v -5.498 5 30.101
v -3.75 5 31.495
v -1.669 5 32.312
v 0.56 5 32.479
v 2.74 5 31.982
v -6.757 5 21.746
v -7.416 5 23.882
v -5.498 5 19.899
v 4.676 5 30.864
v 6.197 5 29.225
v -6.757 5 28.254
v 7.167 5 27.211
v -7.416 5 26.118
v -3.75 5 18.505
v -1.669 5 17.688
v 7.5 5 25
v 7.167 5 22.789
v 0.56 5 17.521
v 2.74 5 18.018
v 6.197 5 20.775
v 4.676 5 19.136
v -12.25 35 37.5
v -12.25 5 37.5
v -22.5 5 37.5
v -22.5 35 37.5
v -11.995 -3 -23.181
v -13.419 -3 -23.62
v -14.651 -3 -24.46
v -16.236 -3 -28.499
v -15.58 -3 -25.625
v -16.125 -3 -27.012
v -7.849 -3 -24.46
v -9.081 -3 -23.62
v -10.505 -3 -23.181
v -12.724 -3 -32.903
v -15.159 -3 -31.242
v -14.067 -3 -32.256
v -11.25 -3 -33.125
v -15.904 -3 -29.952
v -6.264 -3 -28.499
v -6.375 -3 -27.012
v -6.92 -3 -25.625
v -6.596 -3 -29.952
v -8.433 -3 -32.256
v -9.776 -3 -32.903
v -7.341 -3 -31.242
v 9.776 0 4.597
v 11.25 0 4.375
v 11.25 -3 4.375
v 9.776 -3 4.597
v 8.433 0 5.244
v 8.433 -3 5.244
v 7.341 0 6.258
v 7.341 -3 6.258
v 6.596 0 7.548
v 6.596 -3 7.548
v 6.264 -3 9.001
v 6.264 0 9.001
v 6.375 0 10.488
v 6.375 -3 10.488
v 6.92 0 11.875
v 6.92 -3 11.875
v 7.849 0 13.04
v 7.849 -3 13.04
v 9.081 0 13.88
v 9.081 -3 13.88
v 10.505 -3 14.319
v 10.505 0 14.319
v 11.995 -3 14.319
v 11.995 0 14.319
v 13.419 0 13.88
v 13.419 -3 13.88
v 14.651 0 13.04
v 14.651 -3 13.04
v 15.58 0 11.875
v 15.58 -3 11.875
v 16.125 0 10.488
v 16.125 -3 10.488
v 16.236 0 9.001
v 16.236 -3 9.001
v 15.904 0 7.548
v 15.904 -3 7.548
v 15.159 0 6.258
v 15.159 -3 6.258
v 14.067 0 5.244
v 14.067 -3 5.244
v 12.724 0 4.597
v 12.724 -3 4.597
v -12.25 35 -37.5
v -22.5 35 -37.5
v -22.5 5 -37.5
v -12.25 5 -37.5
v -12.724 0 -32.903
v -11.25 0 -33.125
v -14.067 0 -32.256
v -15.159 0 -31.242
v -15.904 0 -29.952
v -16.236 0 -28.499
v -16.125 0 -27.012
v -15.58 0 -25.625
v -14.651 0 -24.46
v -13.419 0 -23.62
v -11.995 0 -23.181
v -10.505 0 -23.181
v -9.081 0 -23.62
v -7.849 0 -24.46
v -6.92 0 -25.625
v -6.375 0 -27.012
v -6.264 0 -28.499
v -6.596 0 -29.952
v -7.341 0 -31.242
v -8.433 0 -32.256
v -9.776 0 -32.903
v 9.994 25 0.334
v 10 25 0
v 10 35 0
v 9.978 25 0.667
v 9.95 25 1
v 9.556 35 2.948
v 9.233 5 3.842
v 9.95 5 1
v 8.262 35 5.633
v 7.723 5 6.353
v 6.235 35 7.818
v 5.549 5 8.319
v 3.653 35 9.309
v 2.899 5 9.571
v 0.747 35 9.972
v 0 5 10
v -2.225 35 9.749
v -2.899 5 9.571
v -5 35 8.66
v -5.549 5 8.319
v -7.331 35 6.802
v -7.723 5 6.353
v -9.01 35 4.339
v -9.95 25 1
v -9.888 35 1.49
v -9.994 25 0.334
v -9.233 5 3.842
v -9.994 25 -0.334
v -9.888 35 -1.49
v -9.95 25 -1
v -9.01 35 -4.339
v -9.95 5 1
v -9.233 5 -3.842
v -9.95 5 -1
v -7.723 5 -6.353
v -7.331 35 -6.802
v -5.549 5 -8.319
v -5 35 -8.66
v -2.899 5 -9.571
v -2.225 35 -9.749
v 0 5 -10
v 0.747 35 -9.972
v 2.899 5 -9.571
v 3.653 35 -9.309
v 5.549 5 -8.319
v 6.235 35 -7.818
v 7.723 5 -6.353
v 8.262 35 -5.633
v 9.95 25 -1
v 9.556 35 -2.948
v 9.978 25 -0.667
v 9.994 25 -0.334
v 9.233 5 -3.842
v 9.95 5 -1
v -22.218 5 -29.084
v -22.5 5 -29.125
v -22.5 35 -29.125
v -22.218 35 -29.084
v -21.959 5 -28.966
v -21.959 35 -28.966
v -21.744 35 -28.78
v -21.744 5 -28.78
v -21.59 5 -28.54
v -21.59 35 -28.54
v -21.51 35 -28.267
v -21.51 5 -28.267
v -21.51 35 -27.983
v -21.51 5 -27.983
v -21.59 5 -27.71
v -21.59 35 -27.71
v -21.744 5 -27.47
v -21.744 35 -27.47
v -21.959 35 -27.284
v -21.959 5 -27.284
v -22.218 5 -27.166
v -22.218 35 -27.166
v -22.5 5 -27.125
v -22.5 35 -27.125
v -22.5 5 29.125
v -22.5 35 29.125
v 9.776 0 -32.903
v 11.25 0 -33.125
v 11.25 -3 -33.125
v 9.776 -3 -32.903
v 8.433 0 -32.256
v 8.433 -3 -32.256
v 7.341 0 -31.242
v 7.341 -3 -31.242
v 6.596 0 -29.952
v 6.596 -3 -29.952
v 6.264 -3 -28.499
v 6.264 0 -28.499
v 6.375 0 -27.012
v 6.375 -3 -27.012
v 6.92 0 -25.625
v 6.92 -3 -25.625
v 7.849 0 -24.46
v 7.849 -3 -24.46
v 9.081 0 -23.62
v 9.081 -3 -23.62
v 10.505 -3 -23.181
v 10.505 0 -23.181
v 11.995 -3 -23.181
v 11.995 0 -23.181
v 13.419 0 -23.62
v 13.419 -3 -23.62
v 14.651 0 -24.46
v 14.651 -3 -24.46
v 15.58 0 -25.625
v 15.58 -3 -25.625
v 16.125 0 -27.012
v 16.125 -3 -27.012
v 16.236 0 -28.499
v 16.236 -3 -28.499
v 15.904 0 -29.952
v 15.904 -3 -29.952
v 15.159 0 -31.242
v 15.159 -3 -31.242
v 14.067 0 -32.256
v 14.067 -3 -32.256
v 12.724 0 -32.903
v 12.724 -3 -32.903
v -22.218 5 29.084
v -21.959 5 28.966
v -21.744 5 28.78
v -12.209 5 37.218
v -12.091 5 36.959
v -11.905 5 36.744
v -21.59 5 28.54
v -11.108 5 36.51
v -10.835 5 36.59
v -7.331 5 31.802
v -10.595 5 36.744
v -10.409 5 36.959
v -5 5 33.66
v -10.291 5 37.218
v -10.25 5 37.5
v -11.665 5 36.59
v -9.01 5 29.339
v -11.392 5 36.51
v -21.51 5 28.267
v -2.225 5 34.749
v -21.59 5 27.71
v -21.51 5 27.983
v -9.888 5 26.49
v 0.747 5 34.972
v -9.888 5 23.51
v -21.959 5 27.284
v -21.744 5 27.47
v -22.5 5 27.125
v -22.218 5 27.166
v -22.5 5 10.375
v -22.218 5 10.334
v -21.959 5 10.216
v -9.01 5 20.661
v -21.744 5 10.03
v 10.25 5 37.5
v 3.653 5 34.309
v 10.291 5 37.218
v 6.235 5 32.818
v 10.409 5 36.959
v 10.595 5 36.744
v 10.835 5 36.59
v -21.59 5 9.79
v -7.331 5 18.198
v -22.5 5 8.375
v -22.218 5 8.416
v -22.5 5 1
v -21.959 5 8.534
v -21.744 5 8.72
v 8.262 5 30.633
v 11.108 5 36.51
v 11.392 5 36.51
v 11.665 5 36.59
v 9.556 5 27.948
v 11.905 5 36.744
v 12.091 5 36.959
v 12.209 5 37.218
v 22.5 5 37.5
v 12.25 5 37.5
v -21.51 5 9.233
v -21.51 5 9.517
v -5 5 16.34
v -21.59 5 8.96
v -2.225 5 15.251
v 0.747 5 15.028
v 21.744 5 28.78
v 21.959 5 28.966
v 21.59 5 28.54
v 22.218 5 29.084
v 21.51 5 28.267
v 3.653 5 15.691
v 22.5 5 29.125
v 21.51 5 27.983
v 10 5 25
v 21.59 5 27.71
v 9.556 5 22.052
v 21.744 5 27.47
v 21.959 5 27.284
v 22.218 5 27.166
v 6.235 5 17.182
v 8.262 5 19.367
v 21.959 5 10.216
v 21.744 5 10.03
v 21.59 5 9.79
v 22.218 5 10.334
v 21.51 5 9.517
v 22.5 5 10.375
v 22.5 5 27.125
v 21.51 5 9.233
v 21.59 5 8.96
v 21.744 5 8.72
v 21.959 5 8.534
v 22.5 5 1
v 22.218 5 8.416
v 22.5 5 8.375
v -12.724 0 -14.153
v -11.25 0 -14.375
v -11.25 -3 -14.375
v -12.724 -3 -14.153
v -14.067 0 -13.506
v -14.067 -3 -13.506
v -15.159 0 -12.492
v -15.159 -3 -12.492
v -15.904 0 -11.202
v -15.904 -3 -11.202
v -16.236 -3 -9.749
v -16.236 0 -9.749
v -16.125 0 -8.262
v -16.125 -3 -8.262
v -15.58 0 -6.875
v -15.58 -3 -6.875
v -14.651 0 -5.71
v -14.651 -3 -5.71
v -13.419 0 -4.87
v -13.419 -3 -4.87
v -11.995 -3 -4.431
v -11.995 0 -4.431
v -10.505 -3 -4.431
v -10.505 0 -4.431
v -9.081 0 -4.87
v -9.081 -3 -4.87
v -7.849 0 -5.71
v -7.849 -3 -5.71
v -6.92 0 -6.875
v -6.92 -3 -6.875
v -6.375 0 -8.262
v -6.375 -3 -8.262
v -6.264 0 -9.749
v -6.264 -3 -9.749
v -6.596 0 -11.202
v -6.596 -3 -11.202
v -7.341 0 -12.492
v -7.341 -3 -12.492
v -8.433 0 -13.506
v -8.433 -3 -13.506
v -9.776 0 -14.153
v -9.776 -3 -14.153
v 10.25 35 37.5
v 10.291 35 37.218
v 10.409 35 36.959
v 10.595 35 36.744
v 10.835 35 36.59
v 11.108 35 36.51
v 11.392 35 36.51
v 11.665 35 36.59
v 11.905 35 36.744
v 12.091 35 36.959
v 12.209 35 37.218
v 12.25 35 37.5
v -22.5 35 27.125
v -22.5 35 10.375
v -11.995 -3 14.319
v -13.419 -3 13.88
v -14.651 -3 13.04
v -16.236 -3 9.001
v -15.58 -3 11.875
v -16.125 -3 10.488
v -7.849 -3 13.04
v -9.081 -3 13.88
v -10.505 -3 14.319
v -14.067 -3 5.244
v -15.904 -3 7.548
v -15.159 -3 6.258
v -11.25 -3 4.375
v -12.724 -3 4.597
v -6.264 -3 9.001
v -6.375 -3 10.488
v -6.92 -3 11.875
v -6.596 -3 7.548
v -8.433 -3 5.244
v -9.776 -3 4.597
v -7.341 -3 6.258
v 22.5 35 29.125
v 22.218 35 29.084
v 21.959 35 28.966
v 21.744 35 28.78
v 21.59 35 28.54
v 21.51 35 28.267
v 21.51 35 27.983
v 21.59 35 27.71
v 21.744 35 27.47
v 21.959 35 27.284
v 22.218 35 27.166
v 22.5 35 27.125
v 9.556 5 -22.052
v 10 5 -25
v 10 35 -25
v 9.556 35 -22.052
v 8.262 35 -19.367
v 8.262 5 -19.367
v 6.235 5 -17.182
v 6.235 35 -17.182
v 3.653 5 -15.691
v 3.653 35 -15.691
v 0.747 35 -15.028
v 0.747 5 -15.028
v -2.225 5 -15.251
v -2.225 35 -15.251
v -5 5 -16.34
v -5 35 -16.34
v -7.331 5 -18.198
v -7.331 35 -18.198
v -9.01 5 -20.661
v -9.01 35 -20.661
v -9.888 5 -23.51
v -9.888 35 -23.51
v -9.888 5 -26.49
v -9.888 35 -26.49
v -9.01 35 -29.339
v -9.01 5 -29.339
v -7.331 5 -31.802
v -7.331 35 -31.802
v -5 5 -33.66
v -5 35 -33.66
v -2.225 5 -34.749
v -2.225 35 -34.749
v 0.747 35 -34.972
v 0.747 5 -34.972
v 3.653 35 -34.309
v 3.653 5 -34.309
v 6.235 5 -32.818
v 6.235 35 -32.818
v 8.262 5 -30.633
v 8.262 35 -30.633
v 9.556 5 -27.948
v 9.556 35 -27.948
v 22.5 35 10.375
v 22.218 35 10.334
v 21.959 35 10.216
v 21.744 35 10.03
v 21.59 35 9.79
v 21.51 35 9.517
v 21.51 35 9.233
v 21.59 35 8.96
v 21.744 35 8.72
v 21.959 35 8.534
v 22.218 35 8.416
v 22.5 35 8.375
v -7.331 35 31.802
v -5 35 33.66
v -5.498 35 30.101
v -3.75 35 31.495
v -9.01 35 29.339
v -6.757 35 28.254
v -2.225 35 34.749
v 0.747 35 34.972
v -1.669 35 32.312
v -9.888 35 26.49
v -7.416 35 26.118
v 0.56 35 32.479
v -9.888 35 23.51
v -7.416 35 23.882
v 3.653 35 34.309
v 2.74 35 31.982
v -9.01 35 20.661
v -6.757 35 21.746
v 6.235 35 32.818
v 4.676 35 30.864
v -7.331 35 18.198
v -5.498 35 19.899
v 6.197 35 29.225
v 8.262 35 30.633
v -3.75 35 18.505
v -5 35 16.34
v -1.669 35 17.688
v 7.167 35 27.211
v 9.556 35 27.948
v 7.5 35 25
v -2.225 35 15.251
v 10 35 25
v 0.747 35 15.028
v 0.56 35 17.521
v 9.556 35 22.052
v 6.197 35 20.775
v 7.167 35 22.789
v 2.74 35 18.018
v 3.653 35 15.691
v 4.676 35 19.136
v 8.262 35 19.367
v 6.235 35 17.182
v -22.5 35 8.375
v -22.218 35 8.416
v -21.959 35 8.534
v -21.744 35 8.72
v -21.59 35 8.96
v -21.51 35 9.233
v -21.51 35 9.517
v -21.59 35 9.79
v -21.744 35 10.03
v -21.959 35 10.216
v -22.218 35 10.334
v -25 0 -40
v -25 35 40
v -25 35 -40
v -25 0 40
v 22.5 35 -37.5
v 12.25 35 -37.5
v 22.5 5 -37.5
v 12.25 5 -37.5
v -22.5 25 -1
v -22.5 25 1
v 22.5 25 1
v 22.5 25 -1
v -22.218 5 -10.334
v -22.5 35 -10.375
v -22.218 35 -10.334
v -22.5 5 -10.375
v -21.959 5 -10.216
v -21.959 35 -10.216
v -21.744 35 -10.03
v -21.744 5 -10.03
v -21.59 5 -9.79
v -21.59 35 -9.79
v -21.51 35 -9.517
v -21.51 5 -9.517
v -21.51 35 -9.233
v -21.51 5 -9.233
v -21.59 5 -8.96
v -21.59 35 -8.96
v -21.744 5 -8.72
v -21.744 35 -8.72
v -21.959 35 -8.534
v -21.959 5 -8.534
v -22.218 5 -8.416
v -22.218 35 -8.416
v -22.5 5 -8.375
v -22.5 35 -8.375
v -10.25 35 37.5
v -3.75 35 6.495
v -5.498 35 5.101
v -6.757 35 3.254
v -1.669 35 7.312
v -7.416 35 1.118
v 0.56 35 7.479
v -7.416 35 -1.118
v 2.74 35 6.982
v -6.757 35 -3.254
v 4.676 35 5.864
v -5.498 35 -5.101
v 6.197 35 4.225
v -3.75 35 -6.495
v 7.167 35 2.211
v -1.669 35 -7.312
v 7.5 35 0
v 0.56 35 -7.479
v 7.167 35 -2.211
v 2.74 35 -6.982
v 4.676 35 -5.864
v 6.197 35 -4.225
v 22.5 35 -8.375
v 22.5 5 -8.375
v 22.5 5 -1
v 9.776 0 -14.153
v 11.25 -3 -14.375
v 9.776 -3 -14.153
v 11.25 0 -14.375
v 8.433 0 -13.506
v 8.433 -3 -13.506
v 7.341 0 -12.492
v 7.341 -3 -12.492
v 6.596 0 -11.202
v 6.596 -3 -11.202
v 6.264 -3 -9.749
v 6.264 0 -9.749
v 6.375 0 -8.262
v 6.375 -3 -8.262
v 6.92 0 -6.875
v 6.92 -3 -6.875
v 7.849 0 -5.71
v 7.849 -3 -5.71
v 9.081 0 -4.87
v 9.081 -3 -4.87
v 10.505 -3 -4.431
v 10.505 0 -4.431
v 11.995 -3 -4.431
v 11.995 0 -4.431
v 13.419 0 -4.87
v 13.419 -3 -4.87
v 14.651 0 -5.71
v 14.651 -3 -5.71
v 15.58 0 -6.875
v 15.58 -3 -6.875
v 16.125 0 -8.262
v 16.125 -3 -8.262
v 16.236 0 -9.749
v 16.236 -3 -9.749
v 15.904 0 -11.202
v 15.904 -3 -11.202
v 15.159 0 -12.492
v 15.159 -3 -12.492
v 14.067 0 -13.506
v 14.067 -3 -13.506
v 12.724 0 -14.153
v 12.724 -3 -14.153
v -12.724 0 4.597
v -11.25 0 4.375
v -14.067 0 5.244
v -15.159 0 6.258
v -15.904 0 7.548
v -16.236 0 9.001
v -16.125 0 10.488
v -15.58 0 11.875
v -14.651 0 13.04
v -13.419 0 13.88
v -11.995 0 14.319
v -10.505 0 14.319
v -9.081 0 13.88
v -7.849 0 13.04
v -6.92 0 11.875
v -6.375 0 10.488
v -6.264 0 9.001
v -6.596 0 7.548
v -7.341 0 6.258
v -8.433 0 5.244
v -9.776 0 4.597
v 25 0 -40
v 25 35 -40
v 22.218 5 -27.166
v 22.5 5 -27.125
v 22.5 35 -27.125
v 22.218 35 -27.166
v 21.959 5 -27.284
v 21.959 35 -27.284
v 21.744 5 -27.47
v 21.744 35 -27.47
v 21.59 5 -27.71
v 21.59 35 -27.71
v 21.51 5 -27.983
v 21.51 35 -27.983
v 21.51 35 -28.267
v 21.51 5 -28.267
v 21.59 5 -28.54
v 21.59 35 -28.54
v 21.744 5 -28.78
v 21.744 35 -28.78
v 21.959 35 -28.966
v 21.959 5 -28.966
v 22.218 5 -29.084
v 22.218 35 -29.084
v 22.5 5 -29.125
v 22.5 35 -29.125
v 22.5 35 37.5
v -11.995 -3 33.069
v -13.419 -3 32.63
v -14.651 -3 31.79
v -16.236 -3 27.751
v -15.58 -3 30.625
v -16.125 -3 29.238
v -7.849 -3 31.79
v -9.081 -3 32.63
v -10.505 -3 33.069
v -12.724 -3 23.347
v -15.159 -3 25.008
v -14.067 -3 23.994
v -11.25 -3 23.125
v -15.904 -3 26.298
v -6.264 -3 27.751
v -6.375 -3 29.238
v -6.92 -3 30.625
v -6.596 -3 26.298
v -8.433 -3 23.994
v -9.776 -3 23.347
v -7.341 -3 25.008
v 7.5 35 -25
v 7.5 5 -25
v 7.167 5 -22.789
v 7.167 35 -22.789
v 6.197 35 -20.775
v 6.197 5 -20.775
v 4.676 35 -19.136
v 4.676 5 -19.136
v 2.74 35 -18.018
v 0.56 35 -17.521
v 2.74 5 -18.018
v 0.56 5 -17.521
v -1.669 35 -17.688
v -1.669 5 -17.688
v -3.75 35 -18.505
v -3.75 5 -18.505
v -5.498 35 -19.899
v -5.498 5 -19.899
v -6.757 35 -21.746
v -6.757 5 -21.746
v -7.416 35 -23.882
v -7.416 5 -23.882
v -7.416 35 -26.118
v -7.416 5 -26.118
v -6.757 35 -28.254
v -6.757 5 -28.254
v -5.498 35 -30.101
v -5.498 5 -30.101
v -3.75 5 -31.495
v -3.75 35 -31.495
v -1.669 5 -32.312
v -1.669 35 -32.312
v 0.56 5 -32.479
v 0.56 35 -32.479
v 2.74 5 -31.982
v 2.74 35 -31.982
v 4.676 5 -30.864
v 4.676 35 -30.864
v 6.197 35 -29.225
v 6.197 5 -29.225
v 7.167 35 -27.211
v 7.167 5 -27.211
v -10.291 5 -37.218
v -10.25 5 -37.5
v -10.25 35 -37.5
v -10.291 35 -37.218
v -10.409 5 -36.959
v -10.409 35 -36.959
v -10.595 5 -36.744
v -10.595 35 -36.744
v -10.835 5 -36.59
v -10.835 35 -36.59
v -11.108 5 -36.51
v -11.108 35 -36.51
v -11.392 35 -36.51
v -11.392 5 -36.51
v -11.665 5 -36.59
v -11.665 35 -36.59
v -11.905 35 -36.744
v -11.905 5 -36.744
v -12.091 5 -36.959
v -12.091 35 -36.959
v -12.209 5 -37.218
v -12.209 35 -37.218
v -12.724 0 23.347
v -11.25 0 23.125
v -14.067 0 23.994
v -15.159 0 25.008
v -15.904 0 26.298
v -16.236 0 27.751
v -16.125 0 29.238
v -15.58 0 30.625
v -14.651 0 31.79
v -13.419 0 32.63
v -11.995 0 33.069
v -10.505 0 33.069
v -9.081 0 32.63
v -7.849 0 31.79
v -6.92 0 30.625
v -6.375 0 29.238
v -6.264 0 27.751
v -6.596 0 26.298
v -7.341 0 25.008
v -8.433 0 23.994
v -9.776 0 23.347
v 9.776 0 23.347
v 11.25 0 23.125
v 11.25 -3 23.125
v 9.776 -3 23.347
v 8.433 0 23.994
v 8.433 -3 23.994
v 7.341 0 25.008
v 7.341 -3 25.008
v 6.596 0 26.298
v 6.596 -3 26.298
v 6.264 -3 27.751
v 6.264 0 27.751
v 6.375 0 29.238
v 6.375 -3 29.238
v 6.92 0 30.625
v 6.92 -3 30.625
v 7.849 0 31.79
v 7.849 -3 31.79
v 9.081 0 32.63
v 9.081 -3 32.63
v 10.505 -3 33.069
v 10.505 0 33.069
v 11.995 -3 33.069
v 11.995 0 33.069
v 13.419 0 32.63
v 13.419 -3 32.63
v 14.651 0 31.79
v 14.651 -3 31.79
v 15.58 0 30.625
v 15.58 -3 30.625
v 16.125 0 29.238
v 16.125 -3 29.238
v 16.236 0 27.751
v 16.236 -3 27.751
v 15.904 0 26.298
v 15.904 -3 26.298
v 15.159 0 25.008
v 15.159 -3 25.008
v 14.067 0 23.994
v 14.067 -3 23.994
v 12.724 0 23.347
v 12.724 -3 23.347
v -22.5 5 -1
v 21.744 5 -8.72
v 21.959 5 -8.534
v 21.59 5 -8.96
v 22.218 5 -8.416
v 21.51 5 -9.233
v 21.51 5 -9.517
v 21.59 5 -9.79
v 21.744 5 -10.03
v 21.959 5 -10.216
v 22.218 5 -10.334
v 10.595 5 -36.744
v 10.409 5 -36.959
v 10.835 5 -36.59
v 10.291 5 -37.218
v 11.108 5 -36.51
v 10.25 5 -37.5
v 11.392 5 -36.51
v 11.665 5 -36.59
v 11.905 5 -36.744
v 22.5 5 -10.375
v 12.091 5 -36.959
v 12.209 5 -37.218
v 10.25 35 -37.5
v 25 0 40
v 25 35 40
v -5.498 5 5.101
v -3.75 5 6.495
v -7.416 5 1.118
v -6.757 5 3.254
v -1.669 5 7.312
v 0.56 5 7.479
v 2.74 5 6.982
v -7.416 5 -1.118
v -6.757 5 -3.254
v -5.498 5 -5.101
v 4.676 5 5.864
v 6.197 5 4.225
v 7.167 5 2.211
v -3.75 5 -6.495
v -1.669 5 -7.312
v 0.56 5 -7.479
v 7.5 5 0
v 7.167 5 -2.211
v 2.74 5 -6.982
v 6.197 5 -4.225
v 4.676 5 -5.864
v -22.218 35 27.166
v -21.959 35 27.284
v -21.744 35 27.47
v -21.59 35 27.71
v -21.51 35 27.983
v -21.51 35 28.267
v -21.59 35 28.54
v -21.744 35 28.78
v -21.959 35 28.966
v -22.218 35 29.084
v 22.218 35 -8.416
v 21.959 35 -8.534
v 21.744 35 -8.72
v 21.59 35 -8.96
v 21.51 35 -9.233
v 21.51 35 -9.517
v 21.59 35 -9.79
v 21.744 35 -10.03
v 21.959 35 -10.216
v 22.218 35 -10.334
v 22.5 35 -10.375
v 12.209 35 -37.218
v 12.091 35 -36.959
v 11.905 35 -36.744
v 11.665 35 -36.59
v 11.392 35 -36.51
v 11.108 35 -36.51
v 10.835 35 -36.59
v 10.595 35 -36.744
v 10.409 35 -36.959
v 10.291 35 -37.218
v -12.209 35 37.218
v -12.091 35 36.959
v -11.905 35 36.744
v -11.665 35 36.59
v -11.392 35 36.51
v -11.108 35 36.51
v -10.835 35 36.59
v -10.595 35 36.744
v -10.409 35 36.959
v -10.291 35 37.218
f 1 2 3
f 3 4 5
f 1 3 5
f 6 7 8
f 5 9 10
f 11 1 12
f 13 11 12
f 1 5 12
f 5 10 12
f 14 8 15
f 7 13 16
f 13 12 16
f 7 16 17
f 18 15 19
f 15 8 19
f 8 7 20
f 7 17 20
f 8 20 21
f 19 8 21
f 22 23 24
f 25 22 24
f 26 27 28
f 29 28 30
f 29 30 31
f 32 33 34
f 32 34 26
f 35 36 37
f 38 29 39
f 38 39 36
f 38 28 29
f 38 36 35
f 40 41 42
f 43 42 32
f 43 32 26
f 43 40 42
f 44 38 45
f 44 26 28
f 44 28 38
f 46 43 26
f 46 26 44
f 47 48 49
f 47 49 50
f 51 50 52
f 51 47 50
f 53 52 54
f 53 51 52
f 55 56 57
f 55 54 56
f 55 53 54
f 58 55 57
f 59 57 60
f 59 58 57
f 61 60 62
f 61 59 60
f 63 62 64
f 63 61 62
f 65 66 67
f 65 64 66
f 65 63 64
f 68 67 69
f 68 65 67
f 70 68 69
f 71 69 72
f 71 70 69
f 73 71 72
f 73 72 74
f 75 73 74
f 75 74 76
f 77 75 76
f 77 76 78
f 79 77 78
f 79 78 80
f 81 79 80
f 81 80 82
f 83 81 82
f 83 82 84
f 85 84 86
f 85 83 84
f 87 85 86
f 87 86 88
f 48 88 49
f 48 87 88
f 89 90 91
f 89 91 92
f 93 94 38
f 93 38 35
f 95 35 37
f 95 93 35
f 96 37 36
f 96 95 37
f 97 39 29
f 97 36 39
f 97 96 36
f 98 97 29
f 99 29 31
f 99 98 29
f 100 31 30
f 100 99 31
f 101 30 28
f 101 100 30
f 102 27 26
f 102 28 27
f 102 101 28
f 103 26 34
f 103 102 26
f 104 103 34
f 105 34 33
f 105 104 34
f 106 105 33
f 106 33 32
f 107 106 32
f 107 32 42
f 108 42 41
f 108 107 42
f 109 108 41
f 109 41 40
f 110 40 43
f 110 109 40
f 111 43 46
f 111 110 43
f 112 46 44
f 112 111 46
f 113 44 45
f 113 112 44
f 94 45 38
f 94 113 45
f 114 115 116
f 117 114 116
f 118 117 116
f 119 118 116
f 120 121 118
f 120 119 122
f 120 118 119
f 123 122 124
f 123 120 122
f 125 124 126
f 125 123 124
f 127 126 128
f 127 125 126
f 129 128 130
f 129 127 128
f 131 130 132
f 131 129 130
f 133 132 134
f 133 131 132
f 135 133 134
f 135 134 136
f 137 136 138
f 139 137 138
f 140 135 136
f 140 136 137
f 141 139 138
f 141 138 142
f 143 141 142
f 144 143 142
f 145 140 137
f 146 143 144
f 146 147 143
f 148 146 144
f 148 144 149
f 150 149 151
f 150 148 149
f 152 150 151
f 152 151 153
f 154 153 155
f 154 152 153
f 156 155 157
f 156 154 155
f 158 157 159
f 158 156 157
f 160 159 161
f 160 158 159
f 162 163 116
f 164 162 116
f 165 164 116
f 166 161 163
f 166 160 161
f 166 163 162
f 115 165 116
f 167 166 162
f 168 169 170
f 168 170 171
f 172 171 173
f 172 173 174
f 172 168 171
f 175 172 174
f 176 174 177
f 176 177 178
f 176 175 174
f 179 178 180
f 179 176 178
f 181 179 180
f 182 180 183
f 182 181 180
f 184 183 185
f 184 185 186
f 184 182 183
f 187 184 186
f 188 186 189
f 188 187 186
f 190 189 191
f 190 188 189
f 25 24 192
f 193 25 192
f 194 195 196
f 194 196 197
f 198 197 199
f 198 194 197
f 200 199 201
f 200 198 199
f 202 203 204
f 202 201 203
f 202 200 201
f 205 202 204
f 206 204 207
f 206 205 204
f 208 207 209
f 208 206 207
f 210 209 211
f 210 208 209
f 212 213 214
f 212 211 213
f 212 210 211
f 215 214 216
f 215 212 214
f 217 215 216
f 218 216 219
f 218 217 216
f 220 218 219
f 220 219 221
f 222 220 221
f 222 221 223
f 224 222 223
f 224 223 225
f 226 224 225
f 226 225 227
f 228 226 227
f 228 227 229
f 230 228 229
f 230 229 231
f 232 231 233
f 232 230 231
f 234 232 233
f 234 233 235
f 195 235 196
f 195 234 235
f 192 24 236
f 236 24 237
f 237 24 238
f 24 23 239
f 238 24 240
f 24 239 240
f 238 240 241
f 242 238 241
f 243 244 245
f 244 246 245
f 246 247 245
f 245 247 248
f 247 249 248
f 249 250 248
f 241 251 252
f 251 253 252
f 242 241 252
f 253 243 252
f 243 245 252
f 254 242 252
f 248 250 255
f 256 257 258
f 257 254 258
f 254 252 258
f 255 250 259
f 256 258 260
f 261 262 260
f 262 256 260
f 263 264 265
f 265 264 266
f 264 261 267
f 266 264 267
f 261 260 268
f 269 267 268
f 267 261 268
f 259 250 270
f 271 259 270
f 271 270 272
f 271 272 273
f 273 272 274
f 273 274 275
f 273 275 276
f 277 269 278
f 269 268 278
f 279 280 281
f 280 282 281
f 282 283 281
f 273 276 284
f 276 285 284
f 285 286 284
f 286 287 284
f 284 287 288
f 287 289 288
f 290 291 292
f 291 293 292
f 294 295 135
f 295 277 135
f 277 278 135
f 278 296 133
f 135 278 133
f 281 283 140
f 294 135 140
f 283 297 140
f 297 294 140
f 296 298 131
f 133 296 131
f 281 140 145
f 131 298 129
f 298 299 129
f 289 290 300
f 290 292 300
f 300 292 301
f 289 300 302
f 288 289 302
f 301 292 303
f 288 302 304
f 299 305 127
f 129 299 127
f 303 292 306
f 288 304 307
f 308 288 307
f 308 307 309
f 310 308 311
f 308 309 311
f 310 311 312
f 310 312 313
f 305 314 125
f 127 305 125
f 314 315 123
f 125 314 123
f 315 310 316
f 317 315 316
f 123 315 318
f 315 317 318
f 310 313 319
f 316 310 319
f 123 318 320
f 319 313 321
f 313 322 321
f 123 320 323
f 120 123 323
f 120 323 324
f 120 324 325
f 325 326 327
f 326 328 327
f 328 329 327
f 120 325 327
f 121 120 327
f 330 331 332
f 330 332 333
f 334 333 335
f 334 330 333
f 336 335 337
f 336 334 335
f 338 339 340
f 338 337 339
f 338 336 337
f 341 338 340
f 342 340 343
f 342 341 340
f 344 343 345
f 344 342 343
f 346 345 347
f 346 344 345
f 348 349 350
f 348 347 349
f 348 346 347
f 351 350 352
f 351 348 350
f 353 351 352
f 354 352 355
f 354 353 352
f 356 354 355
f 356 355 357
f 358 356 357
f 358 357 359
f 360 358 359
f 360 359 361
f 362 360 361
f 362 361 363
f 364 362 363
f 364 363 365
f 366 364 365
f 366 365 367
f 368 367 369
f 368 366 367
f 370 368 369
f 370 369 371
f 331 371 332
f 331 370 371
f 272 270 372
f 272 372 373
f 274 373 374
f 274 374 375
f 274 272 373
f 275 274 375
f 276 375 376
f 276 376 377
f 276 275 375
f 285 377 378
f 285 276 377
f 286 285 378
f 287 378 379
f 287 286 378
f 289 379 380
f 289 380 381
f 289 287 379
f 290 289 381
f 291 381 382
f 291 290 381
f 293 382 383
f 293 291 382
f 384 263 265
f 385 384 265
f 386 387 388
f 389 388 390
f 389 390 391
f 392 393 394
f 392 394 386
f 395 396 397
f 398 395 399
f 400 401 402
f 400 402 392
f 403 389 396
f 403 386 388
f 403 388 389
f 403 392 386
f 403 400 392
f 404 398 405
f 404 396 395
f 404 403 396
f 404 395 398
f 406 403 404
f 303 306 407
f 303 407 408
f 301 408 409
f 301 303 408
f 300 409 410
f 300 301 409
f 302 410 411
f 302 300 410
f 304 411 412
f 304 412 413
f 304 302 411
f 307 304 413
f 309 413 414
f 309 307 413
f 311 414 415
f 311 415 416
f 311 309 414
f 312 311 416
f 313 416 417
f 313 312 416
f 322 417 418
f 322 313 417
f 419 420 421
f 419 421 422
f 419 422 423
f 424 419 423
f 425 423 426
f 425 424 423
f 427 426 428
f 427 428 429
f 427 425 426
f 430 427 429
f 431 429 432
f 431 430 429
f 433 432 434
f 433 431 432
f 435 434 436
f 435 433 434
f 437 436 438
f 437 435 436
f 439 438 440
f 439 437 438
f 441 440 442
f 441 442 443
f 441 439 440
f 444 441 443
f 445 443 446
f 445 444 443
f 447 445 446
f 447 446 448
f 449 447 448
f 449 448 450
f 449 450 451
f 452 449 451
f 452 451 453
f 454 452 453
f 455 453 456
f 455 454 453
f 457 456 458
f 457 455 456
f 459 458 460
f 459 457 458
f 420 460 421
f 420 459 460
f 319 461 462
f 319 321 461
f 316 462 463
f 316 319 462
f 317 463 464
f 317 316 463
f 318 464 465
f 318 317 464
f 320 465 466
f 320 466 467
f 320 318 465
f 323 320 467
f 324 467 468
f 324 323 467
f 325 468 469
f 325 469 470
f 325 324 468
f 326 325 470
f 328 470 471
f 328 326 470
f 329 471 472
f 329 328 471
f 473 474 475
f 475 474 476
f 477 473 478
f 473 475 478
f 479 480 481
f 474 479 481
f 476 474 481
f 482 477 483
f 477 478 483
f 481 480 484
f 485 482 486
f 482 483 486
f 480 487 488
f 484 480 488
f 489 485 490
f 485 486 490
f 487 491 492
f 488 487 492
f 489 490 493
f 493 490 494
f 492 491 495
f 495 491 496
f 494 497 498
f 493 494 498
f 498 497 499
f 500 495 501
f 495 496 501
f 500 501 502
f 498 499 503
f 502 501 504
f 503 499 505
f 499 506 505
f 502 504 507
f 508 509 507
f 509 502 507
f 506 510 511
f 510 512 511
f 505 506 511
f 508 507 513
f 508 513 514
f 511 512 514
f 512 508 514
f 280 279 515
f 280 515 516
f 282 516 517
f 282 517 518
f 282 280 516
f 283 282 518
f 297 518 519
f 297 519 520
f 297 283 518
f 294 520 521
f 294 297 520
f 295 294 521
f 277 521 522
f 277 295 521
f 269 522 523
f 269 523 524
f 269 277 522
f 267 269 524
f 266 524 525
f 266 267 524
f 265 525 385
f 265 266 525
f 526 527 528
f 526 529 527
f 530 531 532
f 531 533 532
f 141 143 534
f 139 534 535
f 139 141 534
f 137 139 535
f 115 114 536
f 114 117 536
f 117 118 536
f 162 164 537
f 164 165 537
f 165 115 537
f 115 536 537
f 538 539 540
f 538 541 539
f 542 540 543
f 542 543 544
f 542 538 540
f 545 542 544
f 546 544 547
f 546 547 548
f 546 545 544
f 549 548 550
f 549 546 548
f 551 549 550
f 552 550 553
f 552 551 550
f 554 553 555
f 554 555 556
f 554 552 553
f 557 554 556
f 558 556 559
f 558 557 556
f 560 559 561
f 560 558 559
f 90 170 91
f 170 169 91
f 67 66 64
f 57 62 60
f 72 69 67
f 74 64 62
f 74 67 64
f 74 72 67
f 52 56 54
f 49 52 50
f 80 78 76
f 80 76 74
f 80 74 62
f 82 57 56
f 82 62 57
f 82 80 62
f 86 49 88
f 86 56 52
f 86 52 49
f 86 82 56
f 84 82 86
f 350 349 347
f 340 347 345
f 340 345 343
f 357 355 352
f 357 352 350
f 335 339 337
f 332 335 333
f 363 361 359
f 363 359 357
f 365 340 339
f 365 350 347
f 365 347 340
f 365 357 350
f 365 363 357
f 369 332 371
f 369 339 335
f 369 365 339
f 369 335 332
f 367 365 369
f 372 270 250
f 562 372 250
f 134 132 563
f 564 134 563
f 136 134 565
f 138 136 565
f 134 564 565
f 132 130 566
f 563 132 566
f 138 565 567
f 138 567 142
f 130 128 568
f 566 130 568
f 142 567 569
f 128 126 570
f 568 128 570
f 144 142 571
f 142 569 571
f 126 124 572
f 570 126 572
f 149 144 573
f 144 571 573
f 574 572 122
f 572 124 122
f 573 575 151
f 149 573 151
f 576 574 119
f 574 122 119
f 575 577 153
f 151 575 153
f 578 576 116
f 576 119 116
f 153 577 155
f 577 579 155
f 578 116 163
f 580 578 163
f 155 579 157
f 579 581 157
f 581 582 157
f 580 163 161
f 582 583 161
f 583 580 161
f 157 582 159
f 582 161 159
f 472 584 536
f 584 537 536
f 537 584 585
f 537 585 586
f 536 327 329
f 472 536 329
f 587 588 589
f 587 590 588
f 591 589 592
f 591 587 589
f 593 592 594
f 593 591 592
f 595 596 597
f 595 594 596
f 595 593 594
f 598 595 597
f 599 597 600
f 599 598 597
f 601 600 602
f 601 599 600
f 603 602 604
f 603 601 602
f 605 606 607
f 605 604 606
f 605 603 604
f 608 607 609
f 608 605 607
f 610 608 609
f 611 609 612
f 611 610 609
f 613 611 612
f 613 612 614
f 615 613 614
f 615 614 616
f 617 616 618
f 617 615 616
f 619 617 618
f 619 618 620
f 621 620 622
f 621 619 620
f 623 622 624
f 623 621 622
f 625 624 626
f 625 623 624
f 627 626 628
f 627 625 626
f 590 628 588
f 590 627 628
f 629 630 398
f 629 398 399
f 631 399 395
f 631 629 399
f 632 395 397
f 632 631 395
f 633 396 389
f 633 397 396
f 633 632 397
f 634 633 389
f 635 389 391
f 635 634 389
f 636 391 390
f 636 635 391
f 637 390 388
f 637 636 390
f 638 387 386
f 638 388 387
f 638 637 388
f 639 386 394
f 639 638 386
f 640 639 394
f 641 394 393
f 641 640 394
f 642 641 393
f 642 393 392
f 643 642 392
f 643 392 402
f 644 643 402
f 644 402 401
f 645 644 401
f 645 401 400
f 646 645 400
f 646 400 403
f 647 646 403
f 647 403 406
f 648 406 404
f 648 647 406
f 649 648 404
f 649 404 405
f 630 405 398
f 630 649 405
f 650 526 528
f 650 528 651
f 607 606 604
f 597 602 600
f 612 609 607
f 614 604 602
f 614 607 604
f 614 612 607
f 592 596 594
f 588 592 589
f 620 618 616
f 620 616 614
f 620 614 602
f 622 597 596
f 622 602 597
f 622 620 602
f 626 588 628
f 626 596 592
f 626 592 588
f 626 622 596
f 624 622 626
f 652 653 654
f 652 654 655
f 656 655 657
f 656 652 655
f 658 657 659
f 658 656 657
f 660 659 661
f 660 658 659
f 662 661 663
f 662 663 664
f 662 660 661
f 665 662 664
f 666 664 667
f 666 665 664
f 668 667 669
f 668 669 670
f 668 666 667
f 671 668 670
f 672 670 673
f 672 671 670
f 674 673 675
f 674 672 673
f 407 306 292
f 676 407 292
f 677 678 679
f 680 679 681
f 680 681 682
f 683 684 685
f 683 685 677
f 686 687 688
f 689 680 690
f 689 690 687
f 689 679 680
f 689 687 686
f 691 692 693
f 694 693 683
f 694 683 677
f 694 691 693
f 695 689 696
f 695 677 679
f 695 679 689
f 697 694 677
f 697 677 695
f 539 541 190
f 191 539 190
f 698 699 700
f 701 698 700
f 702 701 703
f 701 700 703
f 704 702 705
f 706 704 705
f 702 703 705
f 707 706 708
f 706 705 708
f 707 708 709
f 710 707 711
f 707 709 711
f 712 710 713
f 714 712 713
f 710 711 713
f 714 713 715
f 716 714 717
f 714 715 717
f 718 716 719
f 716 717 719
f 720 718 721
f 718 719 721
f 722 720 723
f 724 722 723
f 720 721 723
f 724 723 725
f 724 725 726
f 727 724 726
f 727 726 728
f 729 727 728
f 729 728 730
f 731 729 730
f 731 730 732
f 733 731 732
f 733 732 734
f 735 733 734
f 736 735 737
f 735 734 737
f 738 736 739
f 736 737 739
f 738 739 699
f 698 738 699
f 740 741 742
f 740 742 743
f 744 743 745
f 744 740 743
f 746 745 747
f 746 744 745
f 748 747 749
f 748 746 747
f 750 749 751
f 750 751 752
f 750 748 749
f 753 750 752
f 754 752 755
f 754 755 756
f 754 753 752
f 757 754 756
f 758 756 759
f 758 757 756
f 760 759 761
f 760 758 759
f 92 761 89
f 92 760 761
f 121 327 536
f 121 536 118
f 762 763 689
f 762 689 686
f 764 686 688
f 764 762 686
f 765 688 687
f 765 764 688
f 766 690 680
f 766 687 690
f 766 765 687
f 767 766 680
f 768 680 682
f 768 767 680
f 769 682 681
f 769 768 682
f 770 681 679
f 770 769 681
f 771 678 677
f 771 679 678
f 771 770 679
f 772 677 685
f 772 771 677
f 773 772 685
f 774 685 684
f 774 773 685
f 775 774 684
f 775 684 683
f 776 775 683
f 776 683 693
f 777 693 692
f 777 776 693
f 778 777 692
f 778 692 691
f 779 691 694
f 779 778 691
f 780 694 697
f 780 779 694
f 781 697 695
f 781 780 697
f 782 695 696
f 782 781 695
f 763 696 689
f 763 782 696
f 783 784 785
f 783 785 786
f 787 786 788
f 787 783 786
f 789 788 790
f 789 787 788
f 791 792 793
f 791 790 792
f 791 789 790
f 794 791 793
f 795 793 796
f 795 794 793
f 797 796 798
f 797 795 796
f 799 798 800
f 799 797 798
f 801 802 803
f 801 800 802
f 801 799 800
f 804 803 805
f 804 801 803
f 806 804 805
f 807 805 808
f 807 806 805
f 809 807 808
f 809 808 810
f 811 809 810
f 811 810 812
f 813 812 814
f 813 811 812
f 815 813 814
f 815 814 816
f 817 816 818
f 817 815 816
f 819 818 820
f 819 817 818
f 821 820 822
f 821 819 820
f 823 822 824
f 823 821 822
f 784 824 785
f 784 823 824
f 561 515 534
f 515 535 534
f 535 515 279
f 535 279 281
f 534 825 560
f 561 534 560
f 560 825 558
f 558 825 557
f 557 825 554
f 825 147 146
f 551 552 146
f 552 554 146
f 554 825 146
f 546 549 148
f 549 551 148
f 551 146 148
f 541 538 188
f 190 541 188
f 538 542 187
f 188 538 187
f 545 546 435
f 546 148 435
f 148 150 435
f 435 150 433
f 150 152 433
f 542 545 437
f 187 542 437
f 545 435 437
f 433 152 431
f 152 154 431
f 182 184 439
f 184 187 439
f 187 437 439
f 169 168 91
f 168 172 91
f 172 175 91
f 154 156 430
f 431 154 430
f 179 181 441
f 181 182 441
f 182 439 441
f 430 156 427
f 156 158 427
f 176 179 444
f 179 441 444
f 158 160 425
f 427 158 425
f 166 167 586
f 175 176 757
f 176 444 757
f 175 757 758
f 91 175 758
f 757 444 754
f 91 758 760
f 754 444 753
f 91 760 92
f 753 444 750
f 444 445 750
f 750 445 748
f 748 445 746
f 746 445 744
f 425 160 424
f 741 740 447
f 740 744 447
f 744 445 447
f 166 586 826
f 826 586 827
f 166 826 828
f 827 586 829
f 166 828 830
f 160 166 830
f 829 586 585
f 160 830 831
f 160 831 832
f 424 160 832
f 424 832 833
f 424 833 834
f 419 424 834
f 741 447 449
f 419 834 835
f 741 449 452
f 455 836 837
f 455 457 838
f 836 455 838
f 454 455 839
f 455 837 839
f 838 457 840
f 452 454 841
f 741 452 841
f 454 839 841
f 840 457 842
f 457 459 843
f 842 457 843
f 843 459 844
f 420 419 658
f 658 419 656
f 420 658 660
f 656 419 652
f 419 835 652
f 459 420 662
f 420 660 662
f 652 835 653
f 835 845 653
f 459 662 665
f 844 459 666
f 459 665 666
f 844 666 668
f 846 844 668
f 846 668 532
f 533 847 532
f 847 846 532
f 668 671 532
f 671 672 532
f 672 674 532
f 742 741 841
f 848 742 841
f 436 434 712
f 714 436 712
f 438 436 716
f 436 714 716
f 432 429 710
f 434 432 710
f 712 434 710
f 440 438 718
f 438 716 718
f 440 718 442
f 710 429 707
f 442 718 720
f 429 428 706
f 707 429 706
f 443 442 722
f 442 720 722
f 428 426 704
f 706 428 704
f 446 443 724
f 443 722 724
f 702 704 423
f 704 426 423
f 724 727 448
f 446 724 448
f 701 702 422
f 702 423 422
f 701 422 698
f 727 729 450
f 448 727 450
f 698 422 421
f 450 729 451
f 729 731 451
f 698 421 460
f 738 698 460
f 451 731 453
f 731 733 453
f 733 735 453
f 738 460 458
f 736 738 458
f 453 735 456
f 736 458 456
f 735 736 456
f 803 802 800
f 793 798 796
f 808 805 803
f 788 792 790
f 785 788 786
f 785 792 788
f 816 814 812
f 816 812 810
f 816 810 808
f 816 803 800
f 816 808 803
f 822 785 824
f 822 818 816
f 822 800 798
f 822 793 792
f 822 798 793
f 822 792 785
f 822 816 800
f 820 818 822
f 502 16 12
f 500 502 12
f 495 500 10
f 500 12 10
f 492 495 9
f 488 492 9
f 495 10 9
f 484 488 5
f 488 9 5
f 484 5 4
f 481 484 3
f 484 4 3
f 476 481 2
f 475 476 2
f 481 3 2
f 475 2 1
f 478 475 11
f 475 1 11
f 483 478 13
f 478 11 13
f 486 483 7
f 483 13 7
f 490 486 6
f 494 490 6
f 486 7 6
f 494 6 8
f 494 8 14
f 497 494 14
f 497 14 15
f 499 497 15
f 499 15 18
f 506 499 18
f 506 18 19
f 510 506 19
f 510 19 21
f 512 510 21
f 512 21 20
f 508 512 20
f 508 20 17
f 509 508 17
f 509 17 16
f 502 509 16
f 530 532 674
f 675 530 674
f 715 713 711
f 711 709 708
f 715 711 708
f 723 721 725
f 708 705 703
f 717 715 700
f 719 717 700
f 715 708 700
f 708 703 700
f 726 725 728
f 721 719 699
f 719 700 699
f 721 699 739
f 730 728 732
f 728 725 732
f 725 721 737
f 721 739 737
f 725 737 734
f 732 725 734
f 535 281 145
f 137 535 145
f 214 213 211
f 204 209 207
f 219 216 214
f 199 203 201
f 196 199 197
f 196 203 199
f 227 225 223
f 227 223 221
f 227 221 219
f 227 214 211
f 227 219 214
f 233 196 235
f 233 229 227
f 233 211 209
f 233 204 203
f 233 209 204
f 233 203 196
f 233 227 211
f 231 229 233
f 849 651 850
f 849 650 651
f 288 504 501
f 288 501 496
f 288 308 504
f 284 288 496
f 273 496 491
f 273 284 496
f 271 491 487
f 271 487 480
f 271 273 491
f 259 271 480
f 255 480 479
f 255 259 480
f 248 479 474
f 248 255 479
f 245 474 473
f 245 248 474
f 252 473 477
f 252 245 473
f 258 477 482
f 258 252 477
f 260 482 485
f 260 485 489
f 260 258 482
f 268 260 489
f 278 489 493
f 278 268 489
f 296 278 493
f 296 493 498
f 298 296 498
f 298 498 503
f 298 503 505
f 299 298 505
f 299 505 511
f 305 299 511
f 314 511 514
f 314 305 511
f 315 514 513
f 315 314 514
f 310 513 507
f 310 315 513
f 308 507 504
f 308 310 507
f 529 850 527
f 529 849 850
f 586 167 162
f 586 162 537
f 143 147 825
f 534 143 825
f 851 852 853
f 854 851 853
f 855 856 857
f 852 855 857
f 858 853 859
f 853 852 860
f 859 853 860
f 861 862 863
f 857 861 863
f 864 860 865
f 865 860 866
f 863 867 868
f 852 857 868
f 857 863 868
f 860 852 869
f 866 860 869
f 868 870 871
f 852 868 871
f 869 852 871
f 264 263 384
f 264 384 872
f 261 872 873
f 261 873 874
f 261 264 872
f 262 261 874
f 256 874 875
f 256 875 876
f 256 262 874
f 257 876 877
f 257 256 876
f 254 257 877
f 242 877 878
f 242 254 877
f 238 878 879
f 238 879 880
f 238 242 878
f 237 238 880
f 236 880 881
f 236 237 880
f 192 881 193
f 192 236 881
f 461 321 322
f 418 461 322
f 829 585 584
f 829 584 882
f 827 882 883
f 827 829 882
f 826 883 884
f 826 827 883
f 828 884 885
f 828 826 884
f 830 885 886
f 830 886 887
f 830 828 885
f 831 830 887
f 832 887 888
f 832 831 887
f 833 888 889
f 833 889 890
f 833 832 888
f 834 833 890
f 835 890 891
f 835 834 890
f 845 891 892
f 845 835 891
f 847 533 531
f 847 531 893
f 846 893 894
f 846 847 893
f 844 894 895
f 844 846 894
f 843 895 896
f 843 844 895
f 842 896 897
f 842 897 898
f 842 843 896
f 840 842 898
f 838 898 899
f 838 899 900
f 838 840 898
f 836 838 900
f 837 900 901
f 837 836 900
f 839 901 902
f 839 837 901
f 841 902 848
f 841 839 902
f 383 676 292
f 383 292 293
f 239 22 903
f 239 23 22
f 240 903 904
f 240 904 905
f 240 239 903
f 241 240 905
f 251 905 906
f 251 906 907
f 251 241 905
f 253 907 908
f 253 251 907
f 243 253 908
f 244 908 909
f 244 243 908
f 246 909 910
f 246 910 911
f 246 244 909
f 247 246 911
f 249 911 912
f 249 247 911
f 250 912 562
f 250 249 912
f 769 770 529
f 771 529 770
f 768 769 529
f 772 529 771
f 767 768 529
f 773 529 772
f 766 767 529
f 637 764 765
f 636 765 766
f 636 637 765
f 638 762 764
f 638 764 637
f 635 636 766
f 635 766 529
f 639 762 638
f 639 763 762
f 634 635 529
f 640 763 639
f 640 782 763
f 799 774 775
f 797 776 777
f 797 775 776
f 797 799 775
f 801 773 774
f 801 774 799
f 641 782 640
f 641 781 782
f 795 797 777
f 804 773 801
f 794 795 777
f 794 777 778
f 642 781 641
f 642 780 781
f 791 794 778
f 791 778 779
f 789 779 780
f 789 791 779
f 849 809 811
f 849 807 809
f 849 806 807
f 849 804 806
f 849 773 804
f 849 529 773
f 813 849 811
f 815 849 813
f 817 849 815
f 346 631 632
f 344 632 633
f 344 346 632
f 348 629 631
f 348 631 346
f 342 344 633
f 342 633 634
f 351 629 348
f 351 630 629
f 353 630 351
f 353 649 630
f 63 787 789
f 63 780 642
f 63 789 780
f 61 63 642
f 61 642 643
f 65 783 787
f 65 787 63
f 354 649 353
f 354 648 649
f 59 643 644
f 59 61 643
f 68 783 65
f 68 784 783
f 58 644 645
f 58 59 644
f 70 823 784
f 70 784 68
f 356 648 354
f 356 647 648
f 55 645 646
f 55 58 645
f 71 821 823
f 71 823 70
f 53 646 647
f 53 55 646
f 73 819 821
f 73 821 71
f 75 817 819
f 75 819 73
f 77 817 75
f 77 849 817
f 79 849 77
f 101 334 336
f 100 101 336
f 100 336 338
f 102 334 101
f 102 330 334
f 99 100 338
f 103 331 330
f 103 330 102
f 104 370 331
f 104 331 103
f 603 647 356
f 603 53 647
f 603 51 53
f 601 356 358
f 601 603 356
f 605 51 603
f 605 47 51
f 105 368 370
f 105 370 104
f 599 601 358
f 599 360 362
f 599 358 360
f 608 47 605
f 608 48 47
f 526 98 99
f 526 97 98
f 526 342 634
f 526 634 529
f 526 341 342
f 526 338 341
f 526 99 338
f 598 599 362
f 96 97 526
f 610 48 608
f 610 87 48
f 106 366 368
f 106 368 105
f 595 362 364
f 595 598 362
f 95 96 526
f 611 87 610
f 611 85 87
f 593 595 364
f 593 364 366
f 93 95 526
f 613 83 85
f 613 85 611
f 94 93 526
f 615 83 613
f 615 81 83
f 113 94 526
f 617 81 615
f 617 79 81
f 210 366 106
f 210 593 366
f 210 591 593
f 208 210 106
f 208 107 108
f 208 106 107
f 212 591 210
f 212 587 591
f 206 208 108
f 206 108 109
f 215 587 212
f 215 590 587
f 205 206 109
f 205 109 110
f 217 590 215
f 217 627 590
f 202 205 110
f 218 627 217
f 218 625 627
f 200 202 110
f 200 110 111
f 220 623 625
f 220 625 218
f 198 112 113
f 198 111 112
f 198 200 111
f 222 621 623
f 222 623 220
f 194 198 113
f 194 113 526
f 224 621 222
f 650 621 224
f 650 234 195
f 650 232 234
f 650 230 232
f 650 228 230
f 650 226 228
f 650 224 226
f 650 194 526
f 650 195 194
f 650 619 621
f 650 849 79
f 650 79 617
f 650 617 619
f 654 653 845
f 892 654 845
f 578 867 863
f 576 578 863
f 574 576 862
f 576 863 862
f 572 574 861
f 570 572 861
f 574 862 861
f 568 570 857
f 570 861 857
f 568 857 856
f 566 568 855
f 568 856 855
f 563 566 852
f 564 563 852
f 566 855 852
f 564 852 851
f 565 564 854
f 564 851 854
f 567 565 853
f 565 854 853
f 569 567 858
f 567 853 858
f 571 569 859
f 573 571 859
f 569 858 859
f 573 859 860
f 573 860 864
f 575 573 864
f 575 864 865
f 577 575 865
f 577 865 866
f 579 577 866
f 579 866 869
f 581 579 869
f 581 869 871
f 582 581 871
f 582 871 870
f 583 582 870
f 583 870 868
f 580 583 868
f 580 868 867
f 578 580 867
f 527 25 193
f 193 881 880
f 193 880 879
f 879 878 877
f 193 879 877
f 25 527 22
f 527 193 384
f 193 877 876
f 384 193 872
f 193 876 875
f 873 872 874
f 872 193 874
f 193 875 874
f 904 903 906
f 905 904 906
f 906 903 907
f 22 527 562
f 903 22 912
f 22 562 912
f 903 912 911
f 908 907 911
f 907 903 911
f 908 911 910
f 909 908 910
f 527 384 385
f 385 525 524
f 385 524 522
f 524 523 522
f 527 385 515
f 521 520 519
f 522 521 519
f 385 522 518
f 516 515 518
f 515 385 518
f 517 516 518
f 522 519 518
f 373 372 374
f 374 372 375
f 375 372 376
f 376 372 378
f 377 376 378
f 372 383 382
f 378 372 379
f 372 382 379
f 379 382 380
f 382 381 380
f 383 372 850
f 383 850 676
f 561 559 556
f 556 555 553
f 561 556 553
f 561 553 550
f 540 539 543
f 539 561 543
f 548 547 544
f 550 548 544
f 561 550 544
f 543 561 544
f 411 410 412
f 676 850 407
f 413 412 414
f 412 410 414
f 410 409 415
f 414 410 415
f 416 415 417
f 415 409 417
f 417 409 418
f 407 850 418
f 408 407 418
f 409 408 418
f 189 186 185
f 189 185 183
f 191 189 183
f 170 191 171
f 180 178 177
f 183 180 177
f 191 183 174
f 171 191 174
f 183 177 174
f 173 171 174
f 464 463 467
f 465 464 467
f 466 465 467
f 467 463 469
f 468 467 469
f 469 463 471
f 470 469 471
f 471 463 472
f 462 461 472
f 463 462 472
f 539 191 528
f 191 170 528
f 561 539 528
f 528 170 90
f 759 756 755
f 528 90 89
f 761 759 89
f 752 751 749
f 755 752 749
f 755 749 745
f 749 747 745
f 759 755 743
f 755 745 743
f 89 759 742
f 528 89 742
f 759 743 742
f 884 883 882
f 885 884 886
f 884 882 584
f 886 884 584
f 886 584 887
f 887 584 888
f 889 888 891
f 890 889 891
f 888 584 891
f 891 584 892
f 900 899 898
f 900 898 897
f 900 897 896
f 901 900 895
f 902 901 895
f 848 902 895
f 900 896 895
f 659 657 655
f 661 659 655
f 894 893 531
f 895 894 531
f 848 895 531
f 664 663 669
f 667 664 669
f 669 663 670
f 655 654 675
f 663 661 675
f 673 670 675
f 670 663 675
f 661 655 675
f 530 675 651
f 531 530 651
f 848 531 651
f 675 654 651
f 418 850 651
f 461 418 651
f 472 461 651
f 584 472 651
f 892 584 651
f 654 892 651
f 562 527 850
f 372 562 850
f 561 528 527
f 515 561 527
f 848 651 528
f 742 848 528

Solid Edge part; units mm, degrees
sketch "Sketch1" plane through (0, 0, 0) normal (0, -1, 0) x (1, 0, 0)
  line L0 (25, -40) -> (25, 40)
  line L1 (25, 40) -> (-25, 40)
  line L2 (-25, 40) -> (-25, -40)
  line L3 (-25, -40) -> (25, -40)
  line L4 (22.5, -37.5) -> (22.5, 37.5)
  line L5 (22.5, 37.5) -> (-22.5, 37.5)
  line L6 (-22.5, 37.5) -> (-22.5, -37.5)
  line L7 (-22.5, -37.5) -> (22.5, -37.5)
extrude "Protrusion1" add sketch "Sketch1" against normal blind 35
sketch "Sketch2" plane through (0, 0, 0) normal (0, -1, 0) x (1, 0, 0)
  line L0 (22.5, 37.5) -> (-22.5, 37.5)
  line L1 (-22.5, 37.5) -> (-22.5, -37.5)
  line L2 (-22.5, -37.5) -> (22.5, -37.5)
  line L3 (22.5, -37.5) -> (22.5, 37.5)
extrude "ExtrudedProtrusion_2" add sketch "Sketch2" against normal blind 5
sketch "Sketch3" plane through (0, 0, 0) normal (0, -1, 0) x (0, 0, -1)
  circle A0 centre (-28.125, 11.25) radius 5
extrude "ExtrudedProtrusion_3" add sketch "Sketch3" along normal blind 3
pattern_linear "Pattern1" count 4 spacing 18.75 along (0, 0, -1) count 2 spacing 22.5 along (-1, 0, 0) of "ExtrudedProtrusion_3"
sketch "Sketch4" plane through (0, 5, 0) normal (0, 1, 0) x (0, 0, -1)
  line L0 (1, -9) -> (1, -22.5)
  line L1 (1, -22.5) -> (-1, -22.5)
  line L2 (-1, -22.5) -> (-1, -8.9443)
  line L3 (-1, -8.9443) -> (1, -9)
  line L4 (1, 9) -> (1, 22.5)
  line L5 (1, 22.5) -> (-1, 22.5)
  line L6 (-1, 22.5) -> (-1, 8.9443)
  line L7 (-1, 8.9443) -> (1, 9)
extrude "ExtrudedProtrusion_8" add sketch "Sketch4" along normal blind 20
sketch "Sketch5" plane through (0, 5, 19.25) normal (0, 1, 0) x (0, 0, 1)
  line L0 (-46.375, -22.5) -> (-48.375, -22.5)
  arc A0 (-48.375, -22.5) -> (-46.375, -22.5) centre (-47.375, -22.5) cw
extrude "ExtrudedProtrusion_9" add sketch "Sketch5" along normal blind 30
sketch "Sketch6" plane through (0, 5, -19.25) normal (0, 1, 0) x (1, 0, 0)
  line L0 (22.5, 8.875) -> (22.5, 9.875)
  line L1 (22.5, 7.875) -> (22.5, 8.875)
  arc A0 (22.5, 7.875) -> (22.5, 9.875) centre (22.5, 8.875) cw
  line L2 (22.5, -9.875) -> (22.5, -8.875)
  line L3 (22.5, -10.875) -> (22.5, -9.875)
  arc A1 (22.5, -10.875) -> (22.5, -8.875) centre (22.5, -9.875) cw
  line L4 (22.5, -28.625) -> (22.5, -27.625)
  line L5 (22.5, -29.625) -> (22.5, -28.625)
  arc A2 (22.5, -29.625) -> (22.5, -27.625) centre (22.5, -28.625) cw
  line L6 (22.5, -47.375) -> (22.5, -46.375)
  line L7 (22.5, -47.375) -> (22.5, -48.375)
  arc A3 (22.5, -48.375) -> (22.5, -46.375) centre (22.5, -47.375) cw
  line L8 (-22.5, -28.625) -> (-22.5, -29.625)
  line L9 (-22.5, -27.625) -> (-22.5, -28.625)
  arc A4 (-22.5, -27.625) -> (-22.5, -29.625) centre (-22.5, -28.625) cw
  line L10 (-22.5, -8.875) -> (-22.5, -10.875)
  arc A5 (-22.5, -8.875) -> (-22.5, -10.875) centre (-22.5, -9.875) cw
  line L11 (-22.5, -47.375) -> (-22.5, -48.375)
  line L12 (-22.5, -46.375) -> (-22.5, -47.375)
  arc A6 (-22.5, -46.375) -> (-22.5, -48.375) centre (-22.5, -47.375) cw
extrude "ExtrudedProtrusion_10" add sketch "Sketch6" along normal blind 30
sketch "Sketch7" plane through (0, 5, 0) normal (0, -1, 0) x (1, 0, 0)
  circle A0 centre (0, -25) radius 10
  circle A1 centre (0, -25) radius 7.5
  circle A2 centre (0, 0) radius 10
  circle A3 centre (0, 0) radius 7.5
  circle A4 centre (0, 25) radius 10
  circle A5 centre (0, 25) radius 7.5
extrude "ExtrudedProtrusion_11" add sketch "Sketch7" against normal blind 30
sketch "Sketch8" plane through (0, 5, -19.25) normal (0, 1, 0) x (1, 0, 0)
  line L0 (-12.25, 18.25) -> (-11.25, 18.25)
  line L1 (-11.25, 18.25) -> (-10.25, 18.25)
  arc A0 (-10.25, 18.25) -> (-12.25, 18.25) centre (-11.25, 18.25) cw
  line L2 (10.25, 18.25) -> (11.25, 18.25)
  line L3 (11.25, 18.25) -> (12.25, 18.25)
  arc A1 (12.25, 18.25) -> (10.25, 18.25) centre (11.25, 18.25) cw
  line L4 (11.25, -56.75) -> (12.25, -56.75)
  line L5 (11.25, -56.75) -> (10.25, -56.75)
  arc A2 (10.25, -56.75) -> (12.25, -56.75) centre (11.25, -56.75) cw
  line L6 (-10.25, -56.75) -> (-11.25, -56.75)
  line L7 (-11.25, -56.75) -> (-12.25, -56.75)
  arc A3 (-12.25, -56.75) -> (-10.25, -56.75) centre (-11.25, -56.75) cw
extrude "ExtrudedProtrusion_12" add sketch "Sketch8" along normal blind 30
